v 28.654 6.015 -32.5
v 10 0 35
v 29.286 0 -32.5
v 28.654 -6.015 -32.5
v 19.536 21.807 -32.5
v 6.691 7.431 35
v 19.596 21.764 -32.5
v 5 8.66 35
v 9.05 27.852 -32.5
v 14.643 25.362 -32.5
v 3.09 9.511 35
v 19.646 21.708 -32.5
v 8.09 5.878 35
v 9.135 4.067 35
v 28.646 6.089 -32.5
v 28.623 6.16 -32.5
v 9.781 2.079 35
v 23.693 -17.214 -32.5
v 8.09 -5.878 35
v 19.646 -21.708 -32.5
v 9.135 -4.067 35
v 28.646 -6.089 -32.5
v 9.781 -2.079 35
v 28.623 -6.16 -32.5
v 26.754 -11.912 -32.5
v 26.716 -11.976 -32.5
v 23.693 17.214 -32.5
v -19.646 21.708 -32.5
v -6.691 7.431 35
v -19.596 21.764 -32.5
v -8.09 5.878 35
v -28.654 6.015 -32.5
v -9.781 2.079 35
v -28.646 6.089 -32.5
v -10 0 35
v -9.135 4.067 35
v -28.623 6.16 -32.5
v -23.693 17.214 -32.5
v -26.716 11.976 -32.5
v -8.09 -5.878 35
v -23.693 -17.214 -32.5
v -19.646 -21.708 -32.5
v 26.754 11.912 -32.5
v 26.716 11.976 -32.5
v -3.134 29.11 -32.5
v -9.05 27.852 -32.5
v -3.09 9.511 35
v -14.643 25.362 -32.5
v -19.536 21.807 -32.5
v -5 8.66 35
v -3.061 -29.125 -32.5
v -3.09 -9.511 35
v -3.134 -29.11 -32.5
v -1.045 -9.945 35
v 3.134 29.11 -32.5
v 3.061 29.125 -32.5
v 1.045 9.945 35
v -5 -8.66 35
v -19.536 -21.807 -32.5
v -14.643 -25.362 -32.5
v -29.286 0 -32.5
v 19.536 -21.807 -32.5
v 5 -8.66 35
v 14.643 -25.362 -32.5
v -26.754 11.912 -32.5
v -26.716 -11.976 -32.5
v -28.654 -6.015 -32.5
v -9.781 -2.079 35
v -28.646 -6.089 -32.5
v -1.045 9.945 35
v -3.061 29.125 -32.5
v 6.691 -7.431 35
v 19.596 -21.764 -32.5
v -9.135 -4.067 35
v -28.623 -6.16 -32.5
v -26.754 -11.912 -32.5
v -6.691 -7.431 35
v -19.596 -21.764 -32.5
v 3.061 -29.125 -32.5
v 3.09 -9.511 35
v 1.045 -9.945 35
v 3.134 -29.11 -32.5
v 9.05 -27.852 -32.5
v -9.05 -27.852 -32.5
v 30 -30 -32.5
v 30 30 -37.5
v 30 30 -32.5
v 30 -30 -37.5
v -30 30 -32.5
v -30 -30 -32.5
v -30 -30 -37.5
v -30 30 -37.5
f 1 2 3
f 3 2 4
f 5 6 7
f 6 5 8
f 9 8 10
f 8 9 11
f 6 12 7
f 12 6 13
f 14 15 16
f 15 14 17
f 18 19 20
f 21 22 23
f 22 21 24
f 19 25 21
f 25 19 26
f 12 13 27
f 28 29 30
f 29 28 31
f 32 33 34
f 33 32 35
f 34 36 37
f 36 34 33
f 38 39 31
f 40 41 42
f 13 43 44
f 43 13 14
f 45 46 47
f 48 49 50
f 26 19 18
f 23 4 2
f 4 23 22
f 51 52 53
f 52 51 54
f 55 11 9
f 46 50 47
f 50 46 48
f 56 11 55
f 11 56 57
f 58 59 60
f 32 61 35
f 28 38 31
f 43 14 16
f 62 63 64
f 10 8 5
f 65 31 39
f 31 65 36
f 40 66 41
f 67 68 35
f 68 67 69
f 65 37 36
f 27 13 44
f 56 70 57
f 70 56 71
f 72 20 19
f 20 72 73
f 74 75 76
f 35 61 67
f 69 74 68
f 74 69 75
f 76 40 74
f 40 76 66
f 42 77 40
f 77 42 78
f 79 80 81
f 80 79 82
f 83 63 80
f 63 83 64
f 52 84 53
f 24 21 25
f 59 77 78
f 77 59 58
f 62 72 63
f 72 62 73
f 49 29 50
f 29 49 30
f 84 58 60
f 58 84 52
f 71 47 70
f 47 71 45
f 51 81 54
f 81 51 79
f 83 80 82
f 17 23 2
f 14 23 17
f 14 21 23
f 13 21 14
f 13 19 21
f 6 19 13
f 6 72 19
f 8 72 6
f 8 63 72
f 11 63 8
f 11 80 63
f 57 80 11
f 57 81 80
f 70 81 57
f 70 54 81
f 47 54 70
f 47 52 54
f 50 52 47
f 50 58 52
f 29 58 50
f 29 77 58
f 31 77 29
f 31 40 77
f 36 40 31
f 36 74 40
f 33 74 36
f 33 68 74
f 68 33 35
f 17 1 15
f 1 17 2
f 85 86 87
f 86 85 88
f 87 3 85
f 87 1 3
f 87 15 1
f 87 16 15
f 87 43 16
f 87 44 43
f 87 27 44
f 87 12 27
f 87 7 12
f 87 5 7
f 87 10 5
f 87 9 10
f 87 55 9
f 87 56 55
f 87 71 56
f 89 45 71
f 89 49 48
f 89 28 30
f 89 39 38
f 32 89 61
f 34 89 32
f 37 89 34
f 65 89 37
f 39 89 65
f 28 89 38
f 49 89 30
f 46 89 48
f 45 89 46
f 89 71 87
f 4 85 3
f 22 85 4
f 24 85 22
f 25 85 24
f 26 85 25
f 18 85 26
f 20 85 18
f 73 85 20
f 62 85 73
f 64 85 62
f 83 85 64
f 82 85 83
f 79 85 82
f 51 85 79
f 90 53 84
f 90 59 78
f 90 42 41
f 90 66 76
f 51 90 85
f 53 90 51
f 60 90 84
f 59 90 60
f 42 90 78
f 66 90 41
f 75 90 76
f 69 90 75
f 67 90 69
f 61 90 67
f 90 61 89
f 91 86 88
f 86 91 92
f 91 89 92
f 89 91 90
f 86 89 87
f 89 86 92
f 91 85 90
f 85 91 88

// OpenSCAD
cone();
module cone(diameter = 30, height=70)
{   
    cylinder(height, diameter, diameter/3, true);
    translate([0,0,-height/2])cube([diameter*2,diameter*2,5], true);
}
